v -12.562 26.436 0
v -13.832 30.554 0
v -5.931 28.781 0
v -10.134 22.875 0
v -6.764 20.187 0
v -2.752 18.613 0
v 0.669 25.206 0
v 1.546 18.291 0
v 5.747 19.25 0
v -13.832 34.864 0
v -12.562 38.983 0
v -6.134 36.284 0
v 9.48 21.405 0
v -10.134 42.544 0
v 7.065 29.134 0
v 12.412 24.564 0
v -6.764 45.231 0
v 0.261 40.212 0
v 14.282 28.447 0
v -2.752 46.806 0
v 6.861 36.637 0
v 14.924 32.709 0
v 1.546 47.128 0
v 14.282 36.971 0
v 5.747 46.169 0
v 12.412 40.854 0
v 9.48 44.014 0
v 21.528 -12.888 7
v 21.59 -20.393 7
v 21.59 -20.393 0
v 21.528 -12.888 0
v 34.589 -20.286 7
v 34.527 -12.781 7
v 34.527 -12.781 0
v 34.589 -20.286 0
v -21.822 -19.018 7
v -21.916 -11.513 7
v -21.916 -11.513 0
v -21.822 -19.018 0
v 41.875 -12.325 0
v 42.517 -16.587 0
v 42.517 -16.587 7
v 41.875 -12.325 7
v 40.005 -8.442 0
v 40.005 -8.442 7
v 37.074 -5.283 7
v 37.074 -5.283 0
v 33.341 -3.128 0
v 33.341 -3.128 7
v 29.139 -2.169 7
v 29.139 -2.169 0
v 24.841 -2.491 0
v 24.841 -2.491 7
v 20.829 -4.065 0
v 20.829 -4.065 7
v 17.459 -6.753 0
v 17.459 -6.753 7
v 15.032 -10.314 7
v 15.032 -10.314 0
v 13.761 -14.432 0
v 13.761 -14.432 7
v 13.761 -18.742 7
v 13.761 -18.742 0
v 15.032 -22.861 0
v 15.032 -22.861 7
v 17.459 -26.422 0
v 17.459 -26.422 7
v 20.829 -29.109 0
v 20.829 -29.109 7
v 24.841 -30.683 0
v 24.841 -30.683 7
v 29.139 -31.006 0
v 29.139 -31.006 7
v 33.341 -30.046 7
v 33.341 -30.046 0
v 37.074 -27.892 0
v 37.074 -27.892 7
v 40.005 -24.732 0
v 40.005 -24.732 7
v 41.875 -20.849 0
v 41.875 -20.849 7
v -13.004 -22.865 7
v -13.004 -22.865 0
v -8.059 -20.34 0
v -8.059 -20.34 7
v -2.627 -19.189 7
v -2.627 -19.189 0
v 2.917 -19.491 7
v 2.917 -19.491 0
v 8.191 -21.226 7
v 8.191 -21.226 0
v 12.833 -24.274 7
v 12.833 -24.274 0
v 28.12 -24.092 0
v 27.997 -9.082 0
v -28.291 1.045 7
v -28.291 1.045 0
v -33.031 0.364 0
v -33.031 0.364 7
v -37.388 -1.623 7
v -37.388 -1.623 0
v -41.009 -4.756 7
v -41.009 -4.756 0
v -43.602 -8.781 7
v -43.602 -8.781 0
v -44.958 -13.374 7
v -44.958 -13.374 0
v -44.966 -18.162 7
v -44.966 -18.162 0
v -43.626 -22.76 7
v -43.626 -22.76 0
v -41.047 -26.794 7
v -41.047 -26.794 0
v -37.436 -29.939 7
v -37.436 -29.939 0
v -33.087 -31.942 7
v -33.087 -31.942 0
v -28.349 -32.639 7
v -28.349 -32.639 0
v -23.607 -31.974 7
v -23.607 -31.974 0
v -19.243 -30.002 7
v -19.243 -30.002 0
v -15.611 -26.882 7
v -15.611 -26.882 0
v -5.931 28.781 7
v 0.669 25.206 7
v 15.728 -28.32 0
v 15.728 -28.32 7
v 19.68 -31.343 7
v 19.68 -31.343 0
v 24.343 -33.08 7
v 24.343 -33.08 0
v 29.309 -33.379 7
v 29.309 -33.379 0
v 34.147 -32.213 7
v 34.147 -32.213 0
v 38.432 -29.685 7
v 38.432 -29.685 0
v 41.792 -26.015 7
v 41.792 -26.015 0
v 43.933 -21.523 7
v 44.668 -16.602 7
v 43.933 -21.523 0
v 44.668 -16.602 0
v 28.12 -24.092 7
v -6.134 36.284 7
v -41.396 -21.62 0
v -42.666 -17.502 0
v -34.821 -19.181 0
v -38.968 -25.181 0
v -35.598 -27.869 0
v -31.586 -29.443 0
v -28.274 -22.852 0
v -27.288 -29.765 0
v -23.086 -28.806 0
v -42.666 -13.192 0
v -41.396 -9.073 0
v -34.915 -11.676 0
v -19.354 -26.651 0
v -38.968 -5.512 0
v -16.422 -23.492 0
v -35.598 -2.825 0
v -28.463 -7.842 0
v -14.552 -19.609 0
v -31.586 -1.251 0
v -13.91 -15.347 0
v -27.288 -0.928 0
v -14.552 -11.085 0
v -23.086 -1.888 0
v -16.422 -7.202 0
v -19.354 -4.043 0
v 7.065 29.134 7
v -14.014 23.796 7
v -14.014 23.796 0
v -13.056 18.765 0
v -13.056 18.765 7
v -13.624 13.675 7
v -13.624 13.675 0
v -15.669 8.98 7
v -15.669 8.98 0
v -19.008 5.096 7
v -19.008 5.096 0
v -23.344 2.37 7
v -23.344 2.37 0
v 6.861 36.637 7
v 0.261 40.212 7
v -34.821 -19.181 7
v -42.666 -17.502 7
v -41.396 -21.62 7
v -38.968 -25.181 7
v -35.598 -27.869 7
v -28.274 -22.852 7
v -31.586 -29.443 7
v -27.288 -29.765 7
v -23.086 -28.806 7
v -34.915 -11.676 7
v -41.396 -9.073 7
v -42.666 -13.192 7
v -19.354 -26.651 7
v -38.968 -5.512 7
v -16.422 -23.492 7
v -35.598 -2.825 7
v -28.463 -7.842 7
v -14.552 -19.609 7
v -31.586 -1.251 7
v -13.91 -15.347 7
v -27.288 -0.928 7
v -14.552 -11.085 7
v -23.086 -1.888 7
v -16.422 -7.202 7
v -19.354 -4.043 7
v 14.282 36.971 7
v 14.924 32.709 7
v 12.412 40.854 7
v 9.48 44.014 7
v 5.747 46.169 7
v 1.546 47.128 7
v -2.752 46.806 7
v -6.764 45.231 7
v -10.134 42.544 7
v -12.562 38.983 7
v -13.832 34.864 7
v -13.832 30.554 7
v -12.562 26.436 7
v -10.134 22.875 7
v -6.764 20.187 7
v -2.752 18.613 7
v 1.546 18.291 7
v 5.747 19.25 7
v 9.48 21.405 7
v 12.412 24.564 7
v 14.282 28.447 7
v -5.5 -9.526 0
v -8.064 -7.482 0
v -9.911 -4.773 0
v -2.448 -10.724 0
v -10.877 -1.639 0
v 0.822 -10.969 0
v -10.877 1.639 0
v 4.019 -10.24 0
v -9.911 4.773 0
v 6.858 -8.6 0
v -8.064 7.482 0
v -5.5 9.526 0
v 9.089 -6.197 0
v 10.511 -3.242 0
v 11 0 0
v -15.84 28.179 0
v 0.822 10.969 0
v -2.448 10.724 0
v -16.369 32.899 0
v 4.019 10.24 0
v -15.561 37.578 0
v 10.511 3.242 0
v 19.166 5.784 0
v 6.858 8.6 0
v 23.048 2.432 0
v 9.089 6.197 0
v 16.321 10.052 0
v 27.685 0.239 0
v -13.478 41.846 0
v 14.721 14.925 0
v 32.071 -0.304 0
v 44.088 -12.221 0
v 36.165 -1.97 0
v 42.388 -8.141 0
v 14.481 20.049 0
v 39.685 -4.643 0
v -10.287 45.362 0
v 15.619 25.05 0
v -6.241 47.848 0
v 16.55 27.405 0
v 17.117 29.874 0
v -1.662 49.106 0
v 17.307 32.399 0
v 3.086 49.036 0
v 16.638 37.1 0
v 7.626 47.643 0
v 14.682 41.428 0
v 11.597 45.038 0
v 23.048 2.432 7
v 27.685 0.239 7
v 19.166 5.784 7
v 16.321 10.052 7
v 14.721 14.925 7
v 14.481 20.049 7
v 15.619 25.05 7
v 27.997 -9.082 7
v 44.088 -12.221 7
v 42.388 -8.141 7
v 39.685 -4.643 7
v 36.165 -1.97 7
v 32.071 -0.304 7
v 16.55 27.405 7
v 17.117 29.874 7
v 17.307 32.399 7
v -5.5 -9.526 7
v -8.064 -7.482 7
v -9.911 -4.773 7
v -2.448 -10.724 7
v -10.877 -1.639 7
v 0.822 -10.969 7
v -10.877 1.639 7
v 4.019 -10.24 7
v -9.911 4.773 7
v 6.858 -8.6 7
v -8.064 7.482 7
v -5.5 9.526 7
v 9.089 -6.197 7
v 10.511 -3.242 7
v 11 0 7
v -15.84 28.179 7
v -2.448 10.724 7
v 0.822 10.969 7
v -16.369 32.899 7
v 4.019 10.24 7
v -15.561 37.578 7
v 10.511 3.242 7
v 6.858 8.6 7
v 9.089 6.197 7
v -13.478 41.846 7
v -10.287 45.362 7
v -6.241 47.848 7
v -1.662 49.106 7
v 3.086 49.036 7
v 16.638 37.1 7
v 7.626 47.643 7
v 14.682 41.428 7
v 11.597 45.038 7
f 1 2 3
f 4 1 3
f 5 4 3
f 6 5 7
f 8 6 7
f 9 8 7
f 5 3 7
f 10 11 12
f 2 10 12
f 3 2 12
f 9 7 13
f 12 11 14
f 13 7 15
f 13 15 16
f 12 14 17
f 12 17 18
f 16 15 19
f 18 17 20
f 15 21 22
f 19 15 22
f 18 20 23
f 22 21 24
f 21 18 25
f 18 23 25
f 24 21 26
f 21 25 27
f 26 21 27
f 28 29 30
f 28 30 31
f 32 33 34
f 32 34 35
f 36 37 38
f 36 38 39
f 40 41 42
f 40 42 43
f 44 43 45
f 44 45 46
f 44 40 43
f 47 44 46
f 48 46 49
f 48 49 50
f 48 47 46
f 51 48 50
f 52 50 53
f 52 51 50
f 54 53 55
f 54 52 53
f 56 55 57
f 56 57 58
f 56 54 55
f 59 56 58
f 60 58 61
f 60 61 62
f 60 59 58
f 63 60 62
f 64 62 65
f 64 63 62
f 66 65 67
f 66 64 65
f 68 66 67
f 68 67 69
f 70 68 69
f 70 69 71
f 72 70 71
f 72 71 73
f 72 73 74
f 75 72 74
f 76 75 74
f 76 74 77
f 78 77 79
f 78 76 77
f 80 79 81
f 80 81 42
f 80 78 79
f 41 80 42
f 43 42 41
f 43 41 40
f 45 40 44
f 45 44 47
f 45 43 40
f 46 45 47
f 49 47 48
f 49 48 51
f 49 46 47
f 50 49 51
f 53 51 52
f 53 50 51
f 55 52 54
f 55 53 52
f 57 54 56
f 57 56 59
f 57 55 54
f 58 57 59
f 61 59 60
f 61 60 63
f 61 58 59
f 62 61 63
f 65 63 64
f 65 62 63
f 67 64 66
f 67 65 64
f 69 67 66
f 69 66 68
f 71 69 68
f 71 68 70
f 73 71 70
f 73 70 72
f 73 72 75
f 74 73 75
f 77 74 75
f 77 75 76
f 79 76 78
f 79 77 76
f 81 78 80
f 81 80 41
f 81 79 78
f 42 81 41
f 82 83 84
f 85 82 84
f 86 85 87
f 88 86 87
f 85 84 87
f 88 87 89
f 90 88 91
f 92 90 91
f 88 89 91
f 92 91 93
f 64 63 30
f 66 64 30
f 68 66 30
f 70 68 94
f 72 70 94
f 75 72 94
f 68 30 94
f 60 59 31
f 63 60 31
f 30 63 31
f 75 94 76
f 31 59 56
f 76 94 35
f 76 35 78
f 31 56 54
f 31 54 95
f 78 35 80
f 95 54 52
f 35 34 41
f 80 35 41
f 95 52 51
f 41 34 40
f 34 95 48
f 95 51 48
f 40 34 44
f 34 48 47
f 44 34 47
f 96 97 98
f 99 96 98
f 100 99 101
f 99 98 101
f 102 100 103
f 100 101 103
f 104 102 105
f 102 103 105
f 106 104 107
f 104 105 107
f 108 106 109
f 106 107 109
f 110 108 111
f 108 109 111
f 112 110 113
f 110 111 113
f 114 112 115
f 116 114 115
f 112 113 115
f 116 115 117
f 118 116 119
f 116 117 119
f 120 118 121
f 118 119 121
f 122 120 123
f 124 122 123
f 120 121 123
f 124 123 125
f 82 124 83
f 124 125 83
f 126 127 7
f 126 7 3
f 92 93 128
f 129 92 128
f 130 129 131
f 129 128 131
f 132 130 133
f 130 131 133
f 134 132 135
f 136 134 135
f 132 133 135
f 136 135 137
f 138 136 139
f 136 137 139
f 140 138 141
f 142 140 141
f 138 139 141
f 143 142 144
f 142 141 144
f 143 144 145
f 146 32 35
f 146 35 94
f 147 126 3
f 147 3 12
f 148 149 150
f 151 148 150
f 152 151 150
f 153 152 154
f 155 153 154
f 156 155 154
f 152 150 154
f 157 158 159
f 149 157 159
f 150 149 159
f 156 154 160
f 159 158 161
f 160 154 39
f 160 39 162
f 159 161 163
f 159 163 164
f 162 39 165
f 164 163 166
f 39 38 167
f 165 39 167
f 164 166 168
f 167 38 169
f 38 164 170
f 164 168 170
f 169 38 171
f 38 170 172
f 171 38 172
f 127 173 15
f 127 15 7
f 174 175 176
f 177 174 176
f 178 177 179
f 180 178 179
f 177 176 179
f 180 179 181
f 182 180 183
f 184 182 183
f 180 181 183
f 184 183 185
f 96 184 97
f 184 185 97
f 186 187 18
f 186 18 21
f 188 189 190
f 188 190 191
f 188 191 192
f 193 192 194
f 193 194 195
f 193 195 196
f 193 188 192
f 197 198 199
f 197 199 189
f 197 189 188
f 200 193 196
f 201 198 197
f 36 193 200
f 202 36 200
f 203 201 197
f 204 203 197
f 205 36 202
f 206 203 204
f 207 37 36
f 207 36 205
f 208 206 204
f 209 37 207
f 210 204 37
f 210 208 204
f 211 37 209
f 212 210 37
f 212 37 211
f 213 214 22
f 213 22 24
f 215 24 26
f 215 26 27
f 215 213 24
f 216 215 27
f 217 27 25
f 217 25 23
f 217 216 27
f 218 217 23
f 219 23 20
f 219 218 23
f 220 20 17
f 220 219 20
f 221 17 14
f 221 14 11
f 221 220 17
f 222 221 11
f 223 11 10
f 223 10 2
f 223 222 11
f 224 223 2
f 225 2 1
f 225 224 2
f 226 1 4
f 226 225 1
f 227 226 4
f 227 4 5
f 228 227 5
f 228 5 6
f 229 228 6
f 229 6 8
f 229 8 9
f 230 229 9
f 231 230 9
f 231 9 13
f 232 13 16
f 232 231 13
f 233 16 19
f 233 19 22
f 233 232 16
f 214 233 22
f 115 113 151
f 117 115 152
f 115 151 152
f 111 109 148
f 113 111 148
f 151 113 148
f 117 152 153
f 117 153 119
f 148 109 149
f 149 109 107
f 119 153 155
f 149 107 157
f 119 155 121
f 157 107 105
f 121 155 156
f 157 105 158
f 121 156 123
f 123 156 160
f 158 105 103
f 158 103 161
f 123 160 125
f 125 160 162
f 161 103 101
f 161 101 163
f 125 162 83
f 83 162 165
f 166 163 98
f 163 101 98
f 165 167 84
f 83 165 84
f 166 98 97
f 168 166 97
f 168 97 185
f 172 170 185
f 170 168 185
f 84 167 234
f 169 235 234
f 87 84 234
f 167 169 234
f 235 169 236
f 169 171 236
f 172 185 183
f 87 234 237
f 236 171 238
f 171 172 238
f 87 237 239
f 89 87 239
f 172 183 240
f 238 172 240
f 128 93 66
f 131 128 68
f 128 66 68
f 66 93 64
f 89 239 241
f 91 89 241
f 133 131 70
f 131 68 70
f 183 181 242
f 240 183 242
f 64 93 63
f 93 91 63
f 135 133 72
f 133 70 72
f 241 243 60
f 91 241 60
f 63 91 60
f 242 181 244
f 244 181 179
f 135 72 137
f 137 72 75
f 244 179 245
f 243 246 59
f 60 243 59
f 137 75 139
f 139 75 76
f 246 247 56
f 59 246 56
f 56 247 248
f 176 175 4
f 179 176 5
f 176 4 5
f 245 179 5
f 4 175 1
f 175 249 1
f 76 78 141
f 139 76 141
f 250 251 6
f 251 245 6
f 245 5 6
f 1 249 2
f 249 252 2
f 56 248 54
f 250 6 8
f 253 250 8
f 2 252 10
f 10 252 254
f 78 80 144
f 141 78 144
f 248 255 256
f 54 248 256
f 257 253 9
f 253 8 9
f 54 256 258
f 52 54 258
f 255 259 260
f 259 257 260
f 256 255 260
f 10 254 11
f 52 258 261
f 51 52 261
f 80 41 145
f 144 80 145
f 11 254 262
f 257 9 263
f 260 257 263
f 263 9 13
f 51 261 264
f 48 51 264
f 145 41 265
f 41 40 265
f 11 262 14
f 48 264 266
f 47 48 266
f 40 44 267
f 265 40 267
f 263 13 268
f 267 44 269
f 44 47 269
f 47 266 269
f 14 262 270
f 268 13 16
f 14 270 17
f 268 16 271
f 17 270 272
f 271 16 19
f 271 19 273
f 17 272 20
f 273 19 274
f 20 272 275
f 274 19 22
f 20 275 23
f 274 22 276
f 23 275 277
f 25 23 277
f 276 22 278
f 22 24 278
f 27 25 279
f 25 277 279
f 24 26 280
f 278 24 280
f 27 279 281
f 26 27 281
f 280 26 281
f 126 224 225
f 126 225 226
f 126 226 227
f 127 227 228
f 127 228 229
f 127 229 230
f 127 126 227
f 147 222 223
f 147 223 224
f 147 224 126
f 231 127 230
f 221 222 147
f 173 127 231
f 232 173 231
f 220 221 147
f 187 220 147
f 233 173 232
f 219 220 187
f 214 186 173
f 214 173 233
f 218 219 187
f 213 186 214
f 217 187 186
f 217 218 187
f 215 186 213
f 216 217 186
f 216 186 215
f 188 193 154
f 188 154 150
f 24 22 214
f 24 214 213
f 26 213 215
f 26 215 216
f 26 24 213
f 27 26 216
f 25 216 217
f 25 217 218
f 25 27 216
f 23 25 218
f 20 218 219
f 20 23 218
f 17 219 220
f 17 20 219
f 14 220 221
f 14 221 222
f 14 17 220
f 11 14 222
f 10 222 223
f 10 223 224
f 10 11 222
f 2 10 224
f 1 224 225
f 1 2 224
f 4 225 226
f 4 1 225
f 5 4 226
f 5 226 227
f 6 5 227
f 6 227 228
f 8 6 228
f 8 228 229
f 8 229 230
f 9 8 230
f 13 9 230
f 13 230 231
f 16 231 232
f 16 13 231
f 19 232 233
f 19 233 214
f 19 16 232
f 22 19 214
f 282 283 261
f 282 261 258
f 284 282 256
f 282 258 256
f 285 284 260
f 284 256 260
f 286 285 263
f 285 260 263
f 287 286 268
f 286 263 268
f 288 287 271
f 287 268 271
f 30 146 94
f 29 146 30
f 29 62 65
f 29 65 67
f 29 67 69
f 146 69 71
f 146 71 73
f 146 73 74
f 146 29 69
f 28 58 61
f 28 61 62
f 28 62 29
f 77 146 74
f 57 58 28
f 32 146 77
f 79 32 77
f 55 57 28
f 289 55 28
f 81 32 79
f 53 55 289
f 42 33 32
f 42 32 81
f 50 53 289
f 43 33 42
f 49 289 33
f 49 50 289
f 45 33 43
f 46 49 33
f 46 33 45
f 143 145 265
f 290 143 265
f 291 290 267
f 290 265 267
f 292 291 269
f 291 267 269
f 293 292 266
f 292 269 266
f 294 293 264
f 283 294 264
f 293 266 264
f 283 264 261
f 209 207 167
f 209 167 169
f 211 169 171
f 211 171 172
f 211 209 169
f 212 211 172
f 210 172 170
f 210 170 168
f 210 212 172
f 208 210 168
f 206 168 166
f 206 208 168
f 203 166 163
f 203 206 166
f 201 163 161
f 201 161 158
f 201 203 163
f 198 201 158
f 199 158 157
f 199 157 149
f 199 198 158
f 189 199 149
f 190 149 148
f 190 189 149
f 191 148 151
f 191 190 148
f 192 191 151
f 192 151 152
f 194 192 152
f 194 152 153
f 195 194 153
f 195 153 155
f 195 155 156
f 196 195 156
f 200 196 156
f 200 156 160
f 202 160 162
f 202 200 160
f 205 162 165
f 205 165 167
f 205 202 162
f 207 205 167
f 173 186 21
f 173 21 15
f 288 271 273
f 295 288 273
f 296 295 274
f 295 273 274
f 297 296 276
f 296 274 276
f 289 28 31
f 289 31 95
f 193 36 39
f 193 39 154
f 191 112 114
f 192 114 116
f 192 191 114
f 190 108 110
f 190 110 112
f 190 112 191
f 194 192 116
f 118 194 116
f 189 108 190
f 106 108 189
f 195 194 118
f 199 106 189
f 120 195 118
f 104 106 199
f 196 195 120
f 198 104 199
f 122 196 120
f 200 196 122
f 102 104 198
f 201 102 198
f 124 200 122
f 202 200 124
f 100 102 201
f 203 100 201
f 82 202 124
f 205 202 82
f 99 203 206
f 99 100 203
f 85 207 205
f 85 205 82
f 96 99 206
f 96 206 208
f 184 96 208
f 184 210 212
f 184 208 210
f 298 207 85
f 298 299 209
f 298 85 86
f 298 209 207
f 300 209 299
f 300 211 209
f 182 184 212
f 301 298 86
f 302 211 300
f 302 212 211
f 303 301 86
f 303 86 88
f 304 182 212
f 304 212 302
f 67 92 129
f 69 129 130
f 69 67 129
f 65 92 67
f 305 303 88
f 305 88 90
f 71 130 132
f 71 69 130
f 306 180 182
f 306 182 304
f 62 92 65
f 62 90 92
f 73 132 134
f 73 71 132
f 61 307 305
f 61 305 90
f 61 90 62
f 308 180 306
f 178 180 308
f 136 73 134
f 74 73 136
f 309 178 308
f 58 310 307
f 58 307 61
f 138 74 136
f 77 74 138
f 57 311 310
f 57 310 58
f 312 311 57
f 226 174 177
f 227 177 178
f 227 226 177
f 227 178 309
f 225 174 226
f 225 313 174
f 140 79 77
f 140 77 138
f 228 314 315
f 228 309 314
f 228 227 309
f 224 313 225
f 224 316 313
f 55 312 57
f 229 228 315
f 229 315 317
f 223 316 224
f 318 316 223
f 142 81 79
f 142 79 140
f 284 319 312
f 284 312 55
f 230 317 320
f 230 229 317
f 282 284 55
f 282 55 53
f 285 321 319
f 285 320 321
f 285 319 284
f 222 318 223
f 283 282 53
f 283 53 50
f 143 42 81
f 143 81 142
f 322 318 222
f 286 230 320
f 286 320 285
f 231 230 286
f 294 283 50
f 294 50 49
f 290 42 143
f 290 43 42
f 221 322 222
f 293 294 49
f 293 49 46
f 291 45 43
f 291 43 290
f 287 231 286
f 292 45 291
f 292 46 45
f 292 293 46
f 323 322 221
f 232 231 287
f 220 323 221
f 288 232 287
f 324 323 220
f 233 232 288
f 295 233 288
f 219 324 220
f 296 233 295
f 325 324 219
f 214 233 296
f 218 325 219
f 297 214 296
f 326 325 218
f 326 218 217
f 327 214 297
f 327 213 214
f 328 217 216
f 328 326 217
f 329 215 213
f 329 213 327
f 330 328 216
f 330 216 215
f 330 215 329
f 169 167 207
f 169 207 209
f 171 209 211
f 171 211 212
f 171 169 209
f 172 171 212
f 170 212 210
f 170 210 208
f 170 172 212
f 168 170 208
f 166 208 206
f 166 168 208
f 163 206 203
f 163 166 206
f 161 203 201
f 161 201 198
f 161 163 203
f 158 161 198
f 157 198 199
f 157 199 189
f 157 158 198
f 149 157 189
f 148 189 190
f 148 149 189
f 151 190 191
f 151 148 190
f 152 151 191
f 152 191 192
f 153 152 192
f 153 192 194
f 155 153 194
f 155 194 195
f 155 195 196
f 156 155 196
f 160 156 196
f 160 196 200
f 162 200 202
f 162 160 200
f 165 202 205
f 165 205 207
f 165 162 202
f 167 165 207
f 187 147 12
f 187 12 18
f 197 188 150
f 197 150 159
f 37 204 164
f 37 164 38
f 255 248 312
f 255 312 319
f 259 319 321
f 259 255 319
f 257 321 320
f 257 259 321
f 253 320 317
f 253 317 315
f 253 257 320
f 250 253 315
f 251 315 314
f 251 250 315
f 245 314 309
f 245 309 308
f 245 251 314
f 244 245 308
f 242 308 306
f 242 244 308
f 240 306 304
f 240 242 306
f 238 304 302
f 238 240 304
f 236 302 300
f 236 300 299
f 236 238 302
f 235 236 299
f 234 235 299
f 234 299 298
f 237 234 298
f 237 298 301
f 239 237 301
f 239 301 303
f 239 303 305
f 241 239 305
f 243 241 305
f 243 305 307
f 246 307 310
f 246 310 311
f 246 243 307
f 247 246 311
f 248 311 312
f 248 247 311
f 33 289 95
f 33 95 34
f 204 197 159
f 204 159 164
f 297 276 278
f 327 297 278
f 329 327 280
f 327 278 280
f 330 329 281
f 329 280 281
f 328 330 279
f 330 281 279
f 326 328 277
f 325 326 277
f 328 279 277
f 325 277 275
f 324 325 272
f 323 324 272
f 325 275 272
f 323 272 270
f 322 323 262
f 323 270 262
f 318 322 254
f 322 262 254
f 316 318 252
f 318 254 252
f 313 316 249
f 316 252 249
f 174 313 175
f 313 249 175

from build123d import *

# Parameters (mm, degrees)
F0_R     = 11
F0_R_2   = 14.458881358
F1_DEPTH = 7
F2_R     = 14.458881358
F2_R_2   = 8.039559278
F3_DEPTH = 7
F2_R_3   = 8.8370833189
F2_R_4   = 8.5599792308


with BuildPart() as f1:
    # F0 (on Top) → F1 (new body)
    with BuildSketch(Plane.XY):
        with BuildLine():
            ThreePointArc((-16.3887088912, -3.8809610224), (-14.4632008437, 8.6294529916), (-4.3682857315, 16.2655992004))
            ThreePointArc((-4.3682857315, 16.2655992004), (-9.8990523893, 19.1236949419), (-14.0136695292, 23.7957412689))
            ThreePointArc((-14.0136695292, 23.7957412689), (-15.6692579733, 8.9795011642), (-28.2909881408, 1.0451535845))
            ThreePointArc((-28.2909881408, 1.0451535845), (-21.8502805621, -0.2350293923), (-16.3887088912, -3.8809610224))
        make_face()
        with BuildLine():
            ThreePointArc((4.8333436091, 16.1335187463), (13.5102668426, 10.0560592392), (16.8419606216, 0))
            ThreePointArc((16.8419606216, 0), (16.6985007154, -2.1935613597), (16.2705649811, -4.3497531857))
            ThreePointArc((16.2705649811, -4.3497531857), (21.5437538805, -0.9758622574), (27.684896041, 0.2390591929))
            ThreePointArc((27.684896041, 0.2390591929), (16.3211772488, 10.0520702575), (15.6189773275, 25.0499436472))
            ThreePointArc((15.6189773275, 25.0499436472), (11.1960774955, 19.4184840816), (4.8333436091, 16.1335187463))
        make_face()
        with BuildLine():
            ThreePointArc((-4.3682857315, 16.2655992004), (0.2233327879, 15.5588921001), (4.8333436091, 16.1335187463))
            ThreePointArc((4.8333436091, 16.1335187463), (0.2417250897, 16.8402258465), (-4.3682857315, 16.2655992004))
        make_face()
        with BuildLine():
            ThreePointArc((16.2705649811, -4.3497531857), (16.6985007154, -2.1935613597), (16.8419606216, 0))
            ThreePointArc((16.8419606216, 0), (13.5102668426, 10.0560592392), (4.8333436091, 16.1335187463))
            ThreePointArc((4.8333436091, 16.1335187463), (0.2233327879, 15.5588921001), (-4.3682857315, 16.2655992004))
            ThreePointArc((-4.3682857315, 16.2655992004), (-14.4632008437, 8.6294529916), (-16.3887088912, -3.8809610224))
            ThreePointArc((-16.3887088912, -3.8809610224), (-13.5860622074, -7.5860341822), (-11.9022792495, -11.9158460147))
            ThreePointArc((-11.9022792495, -11.9158460147), (-0.2417250897, -16.8402258465), (11.5553652821, -12.2525577238))
            ThreePointArc((11.5553652821, -12.2525577238), (13.3627294195, -7.9728579179), (16.2705649811, -4.3497531857))
        make_face()
        Circle(F0_R, mode=Mode.SUBTRACT)
        with BuildLine():
            ThreePointArc((11.5553652821, -12.2525577238), (14.4632008437, -8.6294529916), (16.2705649811, -4.3497531857))
            ThreePointArc((16.2705649811, -4.3497531857), (13.3627294195, -7.9728579179), (11.5553652821, -12.2525577238))
        make_face()
        with BuildLine():
            ThreePointArc((27.684896041, 0.2390591929), (21.5437538805, -0.9758622574), (16.2705649811, -4.3497531857))
            ThreePointArc((16.2705649811, -4.3497531857), (14.4632008437, -8.6294529916), (11.5553652821, -12.2525577238))
            ThreePointArc((11.5553652821, -12.2525577238), (11.0782250409, -18.3816386942), (12.8325226015, -24.2736448398))
            ThreePointArc((12.8325226015, -24.2736448398), (31.7713869007, -32.9756126383), (44.6678908848, -16.6023109095))
            ThreePointArc((44.6678908848, -16.6023109095), (39.6850268722, -4.6434871715), (27.684896041, 0.2390591929))
        make_face()
        with Locations((28.0585624278, -16.587106511)):
            Circle(F0_R_2, mode=Mode.SUBTRACT)
        with BuildLine():
            ThreePointArc((-4.3682857315, 16.2655992004), (0.2417250897, 16.8402258465), (4.8333436091, 16.1335187463))
            ThreePointArc((4.8333436091, 16.1335187463), (11.1960774955, 19.4184840816), (15.6189773275, 25.0499436472))
            ThreePointArc((15.6189773275, 25.0499436472), (16.8795842524, 28.628844552), (17.3070184992, 32.3991179466))
            ThreePointArc((17.3070184992, 32.3991179466), (-3.99596671, 48.6395273383), (-14.0136695292, 23.7957412689))
            ThreePointArc((-14.0136695292, 23.7957412689), (-9.8990523893, 19.1236949419), (-4.3682857315, 16.2655992004))
        make_face()
        with Locations((0.4650578776, 32.7091552317)):
            Circle(F0_R_2, mode=Mode.SUBTRACT)
        with BuildLine():
            ThreePointArc((-11.9022792495, -11.9158460147), (-14.7049259333, -8.2107728549), (-16.3887088912, -3.8809610224))
            ThreePointArc((-16.3887088912, -3.8809610224), (-21.8502805621, -0.2350293923), (-28.2909881408, 1.0451535845))
            ThreePointArc((-28.2909881408, 1.0451535845), (-42.4807074983, -24.8689347994), (-13.0040569082, -22.8651428433))
            ThreePointArc((-13.0040569082, -22.8651428433), (-11.8423782995, -19.4154907574), (-11.4490275192, -15.7968070371))
            ThreePointArc((-11.4490275192, -15.7968070371), (-11.5627242236, -13.8431376953), (-11.9022792495, -11.9158460147))
        make_face()
        with Locations((-28.3686034381, -15.3469489887)):
            Circle(F0_R_2, mode=Mode.SUBTRACT)
        with BuildLine():
            ThreePointArc((-11.9022792495, -11.9158460147), (-13.5860622074, -7.5860341822), (-16.3887088912, -3.8809610224))
            ThreePointArc((-16.3887088912, -3.8809610224), (-14.7049259333, -8.2107728549), (-11.9022792495, -11.9158460147))
        make_face()
        with BuildLine():
            ThreePointArc((12.8325226015, -24.2736448398), (11.0782250409, -18.3816386942), (11.5553652821, -12.2525577238))
            ThreePointArc((11.5553652821, -12.2525577238), (-0.2417250897, -16.8402258465), (-11.9022792495, -11.9158460147))
            ThreePointArc((-11.9022792495, -11.9158460147), (-11.5627242236, -13.8431376953), (-11.4490275192, -15.7968070371))
            ThreePointArc((-11.4490275192, -15.7968070371), (-11.8423782995, -19.4154907574), (-13.0040569082, -22.8651428433))
            ThreePointArc((-13.0040569082, -22.8651428433), (0.1547742209, -19.1570704245), (12.8325226015, -24.2736448398))
        make_face()
    extrude(amount=F1_DEPTH)


with BuildPart() as f3:
    # F2 (on face) → F3 (new body)
    with BuildSketch(Plane.XY.offset(7)):
        with Locations((0.4650578776, 32.7091552317)):
            Circle(F2_R)
        with Locations((0.4650578776, 32.7091552317)):
            Circle(F2_R_2, mode=Mode.SUBTRACT)
        with Locations((0.4650578776, 32.7091552317)):
            Circle(F2_R_2)
        Polygon((6.8607923379, 36.6369935745), (7.0645328945, 29.1342058847), (0.6687984343, 25.2063675419), (-5.9306765827, 28.7813168889), (-6.1344171394, 36.2841045788), (0.2613173209, 40.2119429216), align=None, mode=Mode.SUBTRACT)
    extrude(amount=-F3_DEPTH)


with BuildPart() as f3b:
    # F2 (on face) → F3, piece 2 (new body)
    with BuildSketch(Plane.XY.offset(7)):
        with Locations((-28.3686034381, -15.3469489887)):
            Circle(F2_R)
        with Locations((-28.3686034381, -15.3469489887)):
            Circle(F2_R_3, mode=Mode.SUBTRACT)
        with Locations((-28.3686034381, -15.3469489887)):
            Circle(F2_R_3)
        Polygon((-34.9151834977, -11.6760331824), (-28.4627871244, -7.8419864461), (-21.9162070649, -11.5129022525), (-21.8220233786, -19.0178647951), (-28.2744197518, -22.8519115314), (-34.8209998114, -19.180995725), align=None, mode=Mode.SUBTRACT)
    extrude(amount=-F3_DEPTH)


with BuildPart() as f3c:
    # F2 (on face) → F3, piece 3 (new body)
    with BuildSketch(Plane.XY.offset(7)):
        with Locations((28.0585624278, -16.587106511)):
            Circle(F2_R)
        with Locations((28.0585624278, -16.587106511)):
            Circle(F2_R_4, mode=Mode.SUBTRACT)
        with Locations((28.0585624278, -16.587106511)):
            Circle(F2_R_4)
        Polygon((21.5279341864, -12.8878865789), (27.9968667425, -9.0818065852), (34.5274949839, -12.7810265173), (34.5891906691, -20.2863264431), (28.120258113, -24.0924064368), (21.5896298717, -20.3931865046), align=None, mode=Mode.SUBTRACT)
    extrude(amount=-F3_DEPTH)


solid = Compound([f1.part, f3.part, f3b.part, f3c.part])
